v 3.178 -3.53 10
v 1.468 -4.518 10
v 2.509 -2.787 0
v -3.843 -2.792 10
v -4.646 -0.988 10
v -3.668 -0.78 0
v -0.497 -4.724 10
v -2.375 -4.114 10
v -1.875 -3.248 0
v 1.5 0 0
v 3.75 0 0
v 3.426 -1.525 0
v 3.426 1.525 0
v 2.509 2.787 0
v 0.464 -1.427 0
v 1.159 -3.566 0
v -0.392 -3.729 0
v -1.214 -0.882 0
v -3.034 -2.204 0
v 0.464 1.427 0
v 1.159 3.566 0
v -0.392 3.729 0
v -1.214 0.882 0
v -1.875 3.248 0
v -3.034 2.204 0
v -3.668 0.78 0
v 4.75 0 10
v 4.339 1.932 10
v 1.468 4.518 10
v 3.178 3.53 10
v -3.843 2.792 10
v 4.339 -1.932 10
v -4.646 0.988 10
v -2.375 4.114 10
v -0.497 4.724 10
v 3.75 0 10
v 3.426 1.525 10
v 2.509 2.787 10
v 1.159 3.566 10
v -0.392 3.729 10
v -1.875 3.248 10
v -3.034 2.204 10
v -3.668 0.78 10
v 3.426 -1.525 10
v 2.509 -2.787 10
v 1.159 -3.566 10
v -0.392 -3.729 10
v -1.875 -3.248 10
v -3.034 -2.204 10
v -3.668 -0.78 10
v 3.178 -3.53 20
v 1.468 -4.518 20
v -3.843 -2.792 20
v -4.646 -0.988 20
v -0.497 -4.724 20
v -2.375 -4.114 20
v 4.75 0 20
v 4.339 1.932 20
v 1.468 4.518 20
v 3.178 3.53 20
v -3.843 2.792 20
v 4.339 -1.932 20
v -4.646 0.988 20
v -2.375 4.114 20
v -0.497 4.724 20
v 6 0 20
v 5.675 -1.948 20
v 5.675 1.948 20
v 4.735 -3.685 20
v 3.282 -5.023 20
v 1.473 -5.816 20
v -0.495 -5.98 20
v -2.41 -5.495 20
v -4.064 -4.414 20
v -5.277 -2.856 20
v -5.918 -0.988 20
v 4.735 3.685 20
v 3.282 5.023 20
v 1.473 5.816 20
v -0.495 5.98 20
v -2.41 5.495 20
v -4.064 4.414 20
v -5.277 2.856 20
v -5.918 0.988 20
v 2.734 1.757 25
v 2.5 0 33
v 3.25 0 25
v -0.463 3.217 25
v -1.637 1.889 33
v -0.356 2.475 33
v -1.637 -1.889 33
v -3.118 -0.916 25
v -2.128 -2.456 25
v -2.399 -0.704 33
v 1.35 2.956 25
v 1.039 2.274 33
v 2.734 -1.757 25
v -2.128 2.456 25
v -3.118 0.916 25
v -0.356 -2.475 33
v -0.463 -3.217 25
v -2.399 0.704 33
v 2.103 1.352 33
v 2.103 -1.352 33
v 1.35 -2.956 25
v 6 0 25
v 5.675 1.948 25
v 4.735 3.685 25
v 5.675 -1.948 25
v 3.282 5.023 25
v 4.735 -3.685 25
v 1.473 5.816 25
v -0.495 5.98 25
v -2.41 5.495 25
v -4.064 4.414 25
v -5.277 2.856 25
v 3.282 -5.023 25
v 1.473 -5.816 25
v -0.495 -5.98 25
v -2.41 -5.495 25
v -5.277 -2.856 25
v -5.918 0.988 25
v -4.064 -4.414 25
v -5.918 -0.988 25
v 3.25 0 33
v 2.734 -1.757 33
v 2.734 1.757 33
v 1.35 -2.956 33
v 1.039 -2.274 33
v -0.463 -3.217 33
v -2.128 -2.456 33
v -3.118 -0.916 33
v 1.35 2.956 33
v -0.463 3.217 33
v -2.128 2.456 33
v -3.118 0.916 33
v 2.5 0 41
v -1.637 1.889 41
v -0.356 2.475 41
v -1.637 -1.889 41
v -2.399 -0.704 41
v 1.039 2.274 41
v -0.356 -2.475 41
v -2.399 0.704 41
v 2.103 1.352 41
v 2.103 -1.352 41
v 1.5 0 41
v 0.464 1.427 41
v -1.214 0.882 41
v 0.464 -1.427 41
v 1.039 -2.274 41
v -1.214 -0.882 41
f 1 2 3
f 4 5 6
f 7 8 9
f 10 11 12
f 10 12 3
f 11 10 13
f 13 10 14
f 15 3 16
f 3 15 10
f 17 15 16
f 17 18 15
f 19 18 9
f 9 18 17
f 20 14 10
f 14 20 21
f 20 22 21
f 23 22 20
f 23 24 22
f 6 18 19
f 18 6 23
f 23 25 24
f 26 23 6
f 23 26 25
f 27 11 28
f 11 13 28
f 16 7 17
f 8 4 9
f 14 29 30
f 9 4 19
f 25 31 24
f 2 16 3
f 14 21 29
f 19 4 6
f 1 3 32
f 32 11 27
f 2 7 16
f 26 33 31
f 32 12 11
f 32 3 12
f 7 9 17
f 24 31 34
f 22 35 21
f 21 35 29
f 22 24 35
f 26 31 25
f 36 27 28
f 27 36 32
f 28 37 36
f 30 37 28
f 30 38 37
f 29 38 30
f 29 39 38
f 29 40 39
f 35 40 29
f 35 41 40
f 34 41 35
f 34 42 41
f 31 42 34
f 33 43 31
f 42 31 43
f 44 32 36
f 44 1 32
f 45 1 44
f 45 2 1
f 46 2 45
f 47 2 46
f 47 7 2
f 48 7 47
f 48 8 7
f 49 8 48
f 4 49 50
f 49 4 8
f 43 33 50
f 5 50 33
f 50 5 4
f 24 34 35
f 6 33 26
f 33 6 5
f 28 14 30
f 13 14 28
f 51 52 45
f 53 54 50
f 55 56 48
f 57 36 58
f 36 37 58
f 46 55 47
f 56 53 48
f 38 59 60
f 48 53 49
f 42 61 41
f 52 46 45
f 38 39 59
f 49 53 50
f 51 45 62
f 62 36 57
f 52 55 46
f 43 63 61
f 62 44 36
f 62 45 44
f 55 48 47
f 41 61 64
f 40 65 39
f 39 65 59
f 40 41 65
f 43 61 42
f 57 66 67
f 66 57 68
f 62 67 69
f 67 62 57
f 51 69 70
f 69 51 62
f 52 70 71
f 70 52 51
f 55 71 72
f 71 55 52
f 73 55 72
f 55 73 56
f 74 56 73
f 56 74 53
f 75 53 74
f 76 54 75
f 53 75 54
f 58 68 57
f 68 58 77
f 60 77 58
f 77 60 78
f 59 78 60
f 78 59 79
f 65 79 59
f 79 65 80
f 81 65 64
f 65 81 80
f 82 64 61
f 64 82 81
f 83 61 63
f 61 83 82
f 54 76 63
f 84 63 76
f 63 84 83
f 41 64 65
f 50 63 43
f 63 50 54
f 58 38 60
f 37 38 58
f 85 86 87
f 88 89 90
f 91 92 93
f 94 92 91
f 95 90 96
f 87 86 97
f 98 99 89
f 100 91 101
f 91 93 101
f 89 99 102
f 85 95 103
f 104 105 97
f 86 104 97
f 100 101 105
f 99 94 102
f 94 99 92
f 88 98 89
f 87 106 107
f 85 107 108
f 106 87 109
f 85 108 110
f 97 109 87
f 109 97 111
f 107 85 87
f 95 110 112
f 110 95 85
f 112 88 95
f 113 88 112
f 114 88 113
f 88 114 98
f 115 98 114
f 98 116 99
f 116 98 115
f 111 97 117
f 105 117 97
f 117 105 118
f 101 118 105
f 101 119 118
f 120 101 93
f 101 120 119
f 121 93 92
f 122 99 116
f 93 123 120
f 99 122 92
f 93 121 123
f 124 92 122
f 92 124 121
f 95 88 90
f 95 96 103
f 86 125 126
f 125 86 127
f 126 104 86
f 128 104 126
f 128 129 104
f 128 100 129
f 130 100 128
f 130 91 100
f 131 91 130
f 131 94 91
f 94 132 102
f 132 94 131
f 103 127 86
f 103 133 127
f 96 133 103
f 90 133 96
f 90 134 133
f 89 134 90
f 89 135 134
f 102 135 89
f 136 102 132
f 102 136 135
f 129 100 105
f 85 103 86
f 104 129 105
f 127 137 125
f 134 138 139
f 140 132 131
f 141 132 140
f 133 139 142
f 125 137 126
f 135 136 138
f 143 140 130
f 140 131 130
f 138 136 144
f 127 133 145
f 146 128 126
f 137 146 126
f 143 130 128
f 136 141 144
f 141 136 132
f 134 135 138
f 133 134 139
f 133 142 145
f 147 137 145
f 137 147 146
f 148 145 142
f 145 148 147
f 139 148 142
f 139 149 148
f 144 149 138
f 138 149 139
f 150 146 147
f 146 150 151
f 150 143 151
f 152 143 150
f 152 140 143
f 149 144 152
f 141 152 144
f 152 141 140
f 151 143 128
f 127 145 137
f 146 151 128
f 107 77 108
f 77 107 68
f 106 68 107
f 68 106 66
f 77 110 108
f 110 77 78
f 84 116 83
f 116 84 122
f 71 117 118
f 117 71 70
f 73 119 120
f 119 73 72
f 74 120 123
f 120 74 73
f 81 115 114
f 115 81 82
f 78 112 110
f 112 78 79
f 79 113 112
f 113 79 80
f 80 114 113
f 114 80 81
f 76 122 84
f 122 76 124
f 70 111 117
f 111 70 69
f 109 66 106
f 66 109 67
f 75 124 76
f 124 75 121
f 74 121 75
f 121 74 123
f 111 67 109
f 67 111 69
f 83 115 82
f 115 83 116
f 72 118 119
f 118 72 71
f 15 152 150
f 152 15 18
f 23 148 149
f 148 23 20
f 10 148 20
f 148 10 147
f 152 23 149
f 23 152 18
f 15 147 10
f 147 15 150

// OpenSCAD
// Tubing hose-barb reducer: joins 8 mm ID silicone tubing to 5 mm ID silicone tubing
// Print orientation: standing upright along +Z, resting on z = 0

// ---------------- Parameters ----------------
// Barbs for 8 mm tubing (z = 0 to 20)
barb_8_h      = 10;   // barb height
barb_8_d0     = 7.5;  // outer diameter at bottom of barb
barb_8_d1     = 9.5;  // outer diameter at top of barb
barb_8_n      = 2;    // number of stacked barbs

// Collar (z = 20 to 25)
collar_d      = 12;    // collar outer diameter

// Barbs for 5 mm tubing (z = 25 to 41)
barb_5_h      = 8;     // barb height
barb_5_d0     = 6.5;   // outer diameter at bottom of barb
barb_5_d1     = 5.0;   // outer diameter at top of barb
barb_5_n      = 2;     // number of stacked barbs

// Through bore
bore_d        = 3;     // through-bore diameter

// ---------------- Model ----------------
difference() {
    union() {
        // 8 mm tubing barbs, stacked, sawtooth profile
        for (i = [0 : barb_8_n - 1]) {
            translate([0, 0, i * barb_8_h])
                cylinder(h = barb_8_h, d1 = barb_8_d0, d2 = barb_8_d1);
        }

        // Cylindrical collar
        translate([0, 0, 20])
            cylinder(h = 5, d = collar_d);

        // 5 mm tubing barbs, stacked, shrinking profile
        for (i = [0 : barb_5_n - 1]) {
            translate([0, 0, 25 + i * barb_5_h])
                cylinder(h = barb_5_h, d1 = barb_5_d0, d2 = barb_5_d1);
        }
    }

    // Through bore, extended past both end faces
    translate([0, 0, -1])
        cylinder(h = 42, d = bore_d);
}
